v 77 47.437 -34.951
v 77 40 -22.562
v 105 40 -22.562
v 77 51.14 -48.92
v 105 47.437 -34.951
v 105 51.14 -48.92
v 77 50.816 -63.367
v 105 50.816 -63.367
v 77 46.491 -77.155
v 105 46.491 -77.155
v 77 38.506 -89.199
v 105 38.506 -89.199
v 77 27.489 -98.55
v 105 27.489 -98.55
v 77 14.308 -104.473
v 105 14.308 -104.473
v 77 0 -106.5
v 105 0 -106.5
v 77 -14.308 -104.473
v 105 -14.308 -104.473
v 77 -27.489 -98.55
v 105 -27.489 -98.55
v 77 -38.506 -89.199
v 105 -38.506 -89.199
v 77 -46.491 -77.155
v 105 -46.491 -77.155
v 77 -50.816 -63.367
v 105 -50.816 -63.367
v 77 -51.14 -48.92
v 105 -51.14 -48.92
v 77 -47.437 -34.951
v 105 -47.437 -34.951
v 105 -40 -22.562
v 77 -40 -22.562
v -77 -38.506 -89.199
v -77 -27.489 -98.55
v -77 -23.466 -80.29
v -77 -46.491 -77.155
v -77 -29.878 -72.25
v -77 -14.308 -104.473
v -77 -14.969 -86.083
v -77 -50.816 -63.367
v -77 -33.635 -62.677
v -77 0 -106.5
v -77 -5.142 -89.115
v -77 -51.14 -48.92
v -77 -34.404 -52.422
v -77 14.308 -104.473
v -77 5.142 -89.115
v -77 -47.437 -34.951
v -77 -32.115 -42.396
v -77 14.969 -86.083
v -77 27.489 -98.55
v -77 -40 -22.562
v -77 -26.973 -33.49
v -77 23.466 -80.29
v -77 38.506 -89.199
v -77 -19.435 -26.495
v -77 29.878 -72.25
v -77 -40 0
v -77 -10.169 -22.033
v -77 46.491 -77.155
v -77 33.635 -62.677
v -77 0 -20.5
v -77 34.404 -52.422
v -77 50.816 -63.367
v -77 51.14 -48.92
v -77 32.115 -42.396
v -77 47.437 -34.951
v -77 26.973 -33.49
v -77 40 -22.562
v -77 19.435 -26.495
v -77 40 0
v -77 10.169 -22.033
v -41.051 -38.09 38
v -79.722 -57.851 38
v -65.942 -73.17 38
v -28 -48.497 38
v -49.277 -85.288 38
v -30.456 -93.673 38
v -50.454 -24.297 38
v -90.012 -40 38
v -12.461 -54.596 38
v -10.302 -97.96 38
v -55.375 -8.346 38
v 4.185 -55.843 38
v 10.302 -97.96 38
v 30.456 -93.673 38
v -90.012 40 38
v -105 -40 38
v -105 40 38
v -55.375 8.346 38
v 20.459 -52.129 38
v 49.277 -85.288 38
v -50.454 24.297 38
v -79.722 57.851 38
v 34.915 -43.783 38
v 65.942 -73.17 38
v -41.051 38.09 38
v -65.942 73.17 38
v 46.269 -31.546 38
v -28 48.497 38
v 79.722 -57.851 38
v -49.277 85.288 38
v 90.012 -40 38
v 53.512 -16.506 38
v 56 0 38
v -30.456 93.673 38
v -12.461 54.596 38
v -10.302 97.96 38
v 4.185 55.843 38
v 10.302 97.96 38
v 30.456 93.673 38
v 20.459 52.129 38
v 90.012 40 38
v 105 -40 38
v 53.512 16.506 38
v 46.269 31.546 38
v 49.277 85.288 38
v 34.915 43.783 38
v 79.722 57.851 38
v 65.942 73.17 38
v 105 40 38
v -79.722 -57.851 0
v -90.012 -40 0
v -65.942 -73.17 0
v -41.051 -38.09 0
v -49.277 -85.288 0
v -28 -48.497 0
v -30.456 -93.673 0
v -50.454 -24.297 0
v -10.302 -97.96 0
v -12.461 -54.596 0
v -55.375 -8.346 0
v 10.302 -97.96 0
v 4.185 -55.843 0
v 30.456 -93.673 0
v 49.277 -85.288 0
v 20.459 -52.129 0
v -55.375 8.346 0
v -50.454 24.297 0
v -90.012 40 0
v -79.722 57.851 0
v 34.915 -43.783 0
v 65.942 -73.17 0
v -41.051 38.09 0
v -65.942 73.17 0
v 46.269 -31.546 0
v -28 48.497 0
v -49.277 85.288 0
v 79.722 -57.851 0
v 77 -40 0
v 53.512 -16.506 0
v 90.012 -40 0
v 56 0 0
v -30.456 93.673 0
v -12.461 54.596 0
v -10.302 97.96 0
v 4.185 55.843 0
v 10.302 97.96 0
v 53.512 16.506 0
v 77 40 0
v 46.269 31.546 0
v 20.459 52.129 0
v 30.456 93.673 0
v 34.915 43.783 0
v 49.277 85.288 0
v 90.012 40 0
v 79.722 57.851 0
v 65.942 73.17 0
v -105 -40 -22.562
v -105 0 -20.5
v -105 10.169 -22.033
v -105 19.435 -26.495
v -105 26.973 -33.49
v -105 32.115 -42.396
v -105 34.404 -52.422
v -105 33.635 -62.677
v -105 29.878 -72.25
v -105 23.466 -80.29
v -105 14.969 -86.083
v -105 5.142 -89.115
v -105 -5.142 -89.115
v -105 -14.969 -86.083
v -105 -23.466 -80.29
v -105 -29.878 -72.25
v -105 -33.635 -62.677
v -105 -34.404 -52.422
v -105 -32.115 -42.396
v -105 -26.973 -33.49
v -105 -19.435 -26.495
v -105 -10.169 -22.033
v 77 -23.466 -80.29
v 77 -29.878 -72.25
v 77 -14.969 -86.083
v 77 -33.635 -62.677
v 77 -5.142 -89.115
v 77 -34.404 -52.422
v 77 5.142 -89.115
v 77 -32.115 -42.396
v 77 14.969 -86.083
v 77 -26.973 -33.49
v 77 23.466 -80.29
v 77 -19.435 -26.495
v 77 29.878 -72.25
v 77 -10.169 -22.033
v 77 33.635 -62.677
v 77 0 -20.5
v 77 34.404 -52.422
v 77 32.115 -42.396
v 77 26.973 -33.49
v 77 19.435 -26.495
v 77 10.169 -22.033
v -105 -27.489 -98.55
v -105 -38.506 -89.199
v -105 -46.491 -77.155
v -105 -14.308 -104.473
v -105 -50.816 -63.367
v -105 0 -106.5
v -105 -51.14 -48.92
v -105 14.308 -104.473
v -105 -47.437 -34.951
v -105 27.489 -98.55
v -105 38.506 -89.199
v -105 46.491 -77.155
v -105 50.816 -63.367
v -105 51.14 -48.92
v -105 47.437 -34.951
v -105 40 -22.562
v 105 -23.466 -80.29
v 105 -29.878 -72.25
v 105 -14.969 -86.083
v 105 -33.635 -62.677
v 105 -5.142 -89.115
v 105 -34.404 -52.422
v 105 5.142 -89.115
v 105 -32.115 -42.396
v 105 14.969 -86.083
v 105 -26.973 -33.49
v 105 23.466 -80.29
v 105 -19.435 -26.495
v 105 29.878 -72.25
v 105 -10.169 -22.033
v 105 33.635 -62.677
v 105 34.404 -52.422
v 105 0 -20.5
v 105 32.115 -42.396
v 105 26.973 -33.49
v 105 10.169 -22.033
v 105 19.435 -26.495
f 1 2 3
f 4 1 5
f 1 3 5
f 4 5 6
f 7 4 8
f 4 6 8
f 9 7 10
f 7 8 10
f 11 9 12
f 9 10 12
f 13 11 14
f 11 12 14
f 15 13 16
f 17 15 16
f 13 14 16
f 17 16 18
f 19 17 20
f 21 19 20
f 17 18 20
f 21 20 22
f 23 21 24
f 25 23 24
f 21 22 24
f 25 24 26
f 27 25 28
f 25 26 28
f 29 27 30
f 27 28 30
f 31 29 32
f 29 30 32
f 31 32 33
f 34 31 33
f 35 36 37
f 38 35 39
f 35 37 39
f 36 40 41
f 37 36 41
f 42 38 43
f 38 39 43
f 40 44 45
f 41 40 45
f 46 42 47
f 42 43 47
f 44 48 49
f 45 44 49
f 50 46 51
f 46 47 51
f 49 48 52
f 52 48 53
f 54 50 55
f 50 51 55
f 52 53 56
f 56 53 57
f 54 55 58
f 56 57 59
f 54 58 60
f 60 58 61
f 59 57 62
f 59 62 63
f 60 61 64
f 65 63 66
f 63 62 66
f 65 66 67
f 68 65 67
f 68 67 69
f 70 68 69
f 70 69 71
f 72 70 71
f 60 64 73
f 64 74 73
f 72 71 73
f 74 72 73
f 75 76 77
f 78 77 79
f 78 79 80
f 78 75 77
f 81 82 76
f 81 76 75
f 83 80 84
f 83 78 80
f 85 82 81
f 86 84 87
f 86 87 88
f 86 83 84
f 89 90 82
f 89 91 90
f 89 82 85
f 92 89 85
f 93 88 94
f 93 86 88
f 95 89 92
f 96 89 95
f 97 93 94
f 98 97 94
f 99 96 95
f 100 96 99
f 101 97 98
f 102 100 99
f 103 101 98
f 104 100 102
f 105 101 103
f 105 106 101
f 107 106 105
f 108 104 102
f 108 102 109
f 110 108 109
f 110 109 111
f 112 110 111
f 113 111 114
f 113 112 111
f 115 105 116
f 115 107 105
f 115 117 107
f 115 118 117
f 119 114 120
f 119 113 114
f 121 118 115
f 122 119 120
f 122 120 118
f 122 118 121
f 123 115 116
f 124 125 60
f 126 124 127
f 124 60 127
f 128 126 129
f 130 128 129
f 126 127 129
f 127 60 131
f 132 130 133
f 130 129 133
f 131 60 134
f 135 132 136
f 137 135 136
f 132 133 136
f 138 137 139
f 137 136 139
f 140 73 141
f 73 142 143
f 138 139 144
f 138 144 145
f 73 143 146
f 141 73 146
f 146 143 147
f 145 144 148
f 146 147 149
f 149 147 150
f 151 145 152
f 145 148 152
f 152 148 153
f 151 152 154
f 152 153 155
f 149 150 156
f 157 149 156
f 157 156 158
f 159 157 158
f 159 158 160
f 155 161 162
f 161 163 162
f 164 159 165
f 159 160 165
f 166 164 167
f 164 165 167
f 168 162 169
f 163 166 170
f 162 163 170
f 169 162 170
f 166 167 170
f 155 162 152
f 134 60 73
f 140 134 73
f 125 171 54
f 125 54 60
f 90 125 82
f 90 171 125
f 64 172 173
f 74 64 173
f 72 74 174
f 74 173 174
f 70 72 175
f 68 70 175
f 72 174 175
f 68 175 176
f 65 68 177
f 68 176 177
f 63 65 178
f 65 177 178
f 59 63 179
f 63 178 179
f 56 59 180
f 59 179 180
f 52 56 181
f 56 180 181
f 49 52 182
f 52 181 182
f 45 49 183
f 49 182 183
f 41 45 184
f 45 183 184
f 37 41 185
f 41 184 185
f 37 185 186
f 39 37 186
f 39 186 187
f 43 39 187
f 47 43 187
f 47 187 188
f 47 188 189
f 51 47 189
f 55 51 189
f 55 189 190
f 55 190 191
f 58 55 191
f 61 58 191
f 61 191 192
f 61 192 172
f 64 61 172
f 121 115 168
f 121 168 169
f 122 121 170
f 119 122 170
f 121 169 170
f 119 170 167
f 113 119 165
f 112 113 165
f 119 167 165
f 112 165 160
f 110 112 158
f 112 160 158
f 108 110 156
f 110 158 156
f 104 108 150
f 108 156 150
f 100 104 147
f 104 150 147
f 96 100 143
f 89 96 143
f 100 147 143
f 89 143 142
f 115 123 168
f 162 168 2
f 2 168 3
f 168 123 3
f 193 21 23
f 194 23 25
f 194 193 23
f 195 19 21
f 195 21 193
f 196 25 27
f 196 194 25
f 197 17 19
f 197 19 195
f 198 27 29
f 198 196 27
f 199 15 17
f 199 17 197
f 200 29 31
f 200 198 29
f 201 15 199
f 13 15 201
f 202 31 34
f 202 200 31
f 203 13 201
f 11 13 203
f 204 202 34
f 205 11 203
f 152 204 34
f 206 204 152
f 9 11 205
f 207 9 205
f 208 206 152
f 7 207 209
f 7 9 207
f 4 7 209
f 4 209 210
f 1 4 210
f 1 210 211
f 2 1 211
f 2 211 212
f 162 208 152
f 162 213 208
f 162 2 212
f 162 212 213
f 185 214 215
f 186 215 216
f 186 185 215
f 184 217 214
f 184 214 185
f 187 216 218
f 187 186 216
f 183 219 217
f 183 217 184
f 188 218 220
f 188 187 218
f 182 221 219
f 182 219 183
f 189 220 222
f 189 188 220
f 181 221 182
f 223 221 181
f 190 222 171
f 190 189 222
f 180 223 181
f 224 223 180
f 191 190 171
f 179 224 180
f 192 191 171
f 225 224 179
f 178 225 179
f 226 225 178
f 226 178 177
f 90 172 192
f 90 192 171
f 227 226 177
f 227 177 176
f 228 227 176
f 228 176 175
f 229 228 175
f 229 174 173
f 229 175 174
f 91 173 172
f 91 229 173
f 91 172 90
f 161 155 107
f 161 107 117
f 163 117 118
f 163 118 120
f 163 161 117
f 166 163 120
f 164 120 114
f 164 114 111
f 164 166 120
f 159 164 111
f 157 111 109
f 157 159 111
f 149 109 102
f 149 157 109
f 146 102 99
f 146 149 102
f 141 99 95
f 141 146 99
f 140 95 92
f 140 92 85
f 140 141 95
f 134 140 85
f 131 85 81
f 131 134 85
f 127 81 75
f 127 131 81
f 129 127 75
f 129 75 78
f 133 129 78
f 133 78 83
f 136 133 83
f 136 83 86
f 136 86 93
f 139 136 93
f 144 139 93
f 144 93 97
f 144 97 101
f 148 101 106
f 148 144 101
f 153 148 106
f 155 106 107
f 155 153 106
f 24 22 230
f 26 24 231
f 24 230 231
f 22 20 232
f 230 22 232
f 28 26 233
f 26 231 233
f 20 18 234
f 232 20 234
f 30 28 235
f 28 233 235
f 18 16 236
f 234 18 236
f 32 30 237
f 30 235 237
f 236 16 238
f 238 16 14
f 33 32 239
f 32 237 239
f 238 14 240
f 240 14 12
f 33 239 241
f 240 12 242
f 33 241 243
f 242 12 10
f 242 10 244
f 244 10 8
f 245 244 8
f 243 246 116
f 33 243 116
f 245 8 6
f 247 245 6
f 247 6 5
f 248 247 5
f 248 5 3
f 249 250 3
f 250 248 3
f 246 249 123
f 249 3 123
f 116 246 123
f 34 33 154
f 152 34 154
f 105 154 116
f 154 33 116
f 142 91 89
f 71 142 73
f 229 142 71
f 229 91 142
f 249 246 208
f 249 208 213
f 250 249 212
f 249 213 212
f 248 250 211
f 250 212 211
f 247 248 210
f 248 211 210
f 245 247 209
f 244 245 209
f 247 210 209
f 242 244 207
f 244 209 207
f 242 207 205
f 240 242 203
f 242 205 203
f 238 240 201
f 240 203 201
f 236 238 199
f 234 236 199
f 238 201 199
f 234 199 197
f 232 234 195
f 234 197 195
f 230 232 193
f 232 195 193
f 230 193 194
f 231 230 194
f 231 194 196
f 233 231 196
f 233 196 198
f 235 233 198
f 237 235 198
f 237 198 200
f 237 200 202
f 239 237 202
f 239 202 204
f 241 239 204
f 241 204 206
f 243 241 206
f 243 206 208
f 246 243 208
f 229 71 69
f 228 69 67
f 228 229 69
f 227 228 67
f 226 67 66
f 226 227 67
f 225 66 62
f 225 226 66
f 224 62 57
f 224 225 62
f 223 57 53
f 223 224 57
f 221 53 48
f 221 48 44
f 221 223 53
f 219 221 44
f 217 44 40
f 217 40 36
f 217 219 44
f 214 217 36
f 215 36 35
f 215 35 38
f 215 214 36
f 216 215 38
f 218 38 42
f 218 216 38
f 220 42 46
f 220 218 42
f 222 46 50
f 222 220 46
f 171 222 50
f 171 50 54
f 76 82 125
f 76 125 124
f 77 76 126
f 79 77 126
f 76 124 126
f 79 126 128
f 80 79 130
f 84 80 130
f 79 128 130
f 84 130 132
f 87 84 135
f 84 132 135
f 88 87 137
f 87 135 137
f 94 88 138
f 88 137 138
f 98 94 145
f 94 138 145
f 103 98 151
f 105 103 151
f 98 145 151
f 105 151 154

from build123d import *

# Parameters (mm, degrees)
SKETCH1_R      = 56
EXTRUDE1_DEPTH = 38
EXTRUDE2_DEPTH = 28
SKETCH3_R      = 34.5
EXTRUDE3_DEPTH = 256.234206172


with BuildPart() as part:
    # Sketch1 → Extrude1 (new body)
    with BuildSketch(Plane.XY):
        with BuildLine():
            Line((-105, -40), (-90.012499132, -40))
            ThreePointArc((-90.012499132, -40), (0, -98.5), (90.012499132, -40))
            Line((90.012499132, -40), (105, -40))
            Line((105, -40), (105, 40))
            Line((105, 40), (90.012499132, 40))
            ThreePointArc((90.012499132, 40), (0, 98.5), (-90.012499132, 40))
            Line((-90.012499132, 40), (-105, 40))
            Line((-105, 40), (-105, -40))
        make_face()
        Circle(SKETCH1_R, mode=Mode.SUBTRACT)
    extrude(amount=EXTRUDE1_DEPTH)

    # Sketch2 → Extrude2 (add)
    with BuildSketch(Plane.ZY.offset(105)):
        with BuildLine():
            Line((0, 40), (-22.561596833, 40))
            ThreePointArc((-22.561596833, 40), (-106.5, 0), (-22.561596833, -40))
            Line((-22.561596833, -40), (0, -40))
            Line((0, -40), (0, 40))
        make_face()
    extrude2 = extrude(amount=-EXTRUDE2_DEPTH)

    # Mirror1: Extrude2 across plane
    add(extrude2.mirror(Plane(origin=(0, 0, 0), x_dir=(0, 0, 1), z_dir=(1, 0, 0))))

    # Sketch3 → Extrude3 (cut, through all)
    with BuildSketch(Plane.ZY.offset(105)):
        with Locations((-55, 0)):
            Circle(SKETCH3_R)
    extrude(amount=-EXTRUDE3_DEPTH, mode=Mode.SUBTRACT)


solid = part.part
